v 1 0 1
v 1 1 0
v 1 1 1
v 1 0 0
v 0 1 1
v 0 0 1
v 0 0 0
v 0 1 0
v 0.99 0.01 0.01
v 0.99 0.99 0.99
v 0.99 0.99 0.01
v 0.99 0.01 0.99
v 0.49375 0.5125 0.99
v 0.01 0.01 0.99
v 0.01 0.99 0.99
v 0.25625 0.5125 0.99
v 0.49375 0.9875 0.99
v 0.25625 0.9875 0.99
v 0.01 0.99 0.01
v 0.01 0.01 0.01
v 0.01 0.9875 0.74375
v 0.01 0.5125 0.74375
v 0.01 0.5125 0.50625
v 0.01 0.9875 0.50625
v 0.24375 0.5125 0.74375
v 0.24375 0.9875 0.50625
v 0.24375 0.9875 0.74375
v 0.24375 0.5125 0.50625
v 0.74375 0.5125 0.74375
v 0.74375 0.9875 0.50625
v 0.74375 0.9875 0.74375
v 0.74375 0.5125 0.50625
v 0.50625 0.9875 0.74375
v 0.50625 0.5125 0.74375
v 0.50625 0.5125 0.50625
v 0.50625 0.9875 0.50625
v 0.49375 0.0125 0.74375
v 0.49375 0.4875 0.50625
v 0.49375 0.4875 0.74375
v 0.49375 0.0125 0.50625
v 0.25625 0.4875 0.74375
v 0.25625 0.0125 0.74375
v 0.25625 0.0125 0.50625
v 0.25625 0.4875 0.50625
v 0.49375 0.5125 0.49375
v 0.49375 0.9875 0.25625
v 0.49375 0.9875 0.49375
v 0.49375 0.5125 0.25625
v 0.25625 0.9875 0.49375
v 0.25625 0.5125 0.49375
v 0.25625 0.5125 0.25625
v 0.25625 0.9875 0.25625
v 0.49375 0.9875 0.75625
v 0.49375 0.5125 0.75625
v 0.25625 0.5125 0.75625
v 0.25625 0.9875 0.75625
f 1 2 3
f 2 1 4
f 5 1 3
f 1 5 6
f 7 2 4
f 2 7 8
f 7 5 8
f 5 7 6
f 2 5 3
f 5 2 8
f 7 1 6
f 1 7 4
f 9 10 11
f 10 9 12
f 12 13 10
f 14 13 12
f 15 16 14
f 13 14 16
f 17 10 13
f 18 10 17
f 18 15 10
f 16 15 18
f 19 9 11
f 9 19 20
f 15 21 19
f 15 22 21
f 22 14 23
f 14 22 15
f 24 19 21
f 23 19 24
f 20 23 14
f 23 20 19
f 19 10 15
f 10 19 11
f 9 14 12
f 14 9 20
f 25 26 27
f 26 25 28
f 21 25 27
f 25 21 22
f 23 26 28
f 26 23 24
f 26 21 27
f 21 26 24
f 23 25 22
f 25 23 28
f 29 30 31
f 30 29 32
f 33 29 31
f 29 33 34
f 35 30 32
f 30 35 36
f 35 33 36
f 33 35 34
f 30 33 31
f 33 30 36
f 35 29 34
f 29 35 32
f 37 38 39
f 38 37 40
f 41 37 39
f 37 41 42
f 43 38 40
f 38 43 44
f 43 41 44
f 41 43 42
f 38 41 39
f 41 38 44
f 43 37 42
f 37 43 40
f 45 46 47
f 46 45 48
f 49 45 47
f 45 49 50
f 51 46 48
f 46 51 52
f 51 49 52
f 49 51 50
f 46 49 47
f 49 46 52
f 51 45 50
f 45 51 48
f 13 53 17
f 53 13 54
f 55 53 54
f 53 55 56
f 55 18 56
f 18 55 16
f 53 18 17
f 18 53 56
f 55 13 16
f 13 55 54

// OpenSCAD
translate([0.125, 0.75, 0.625]) color([0.23874719597172656, 0.5159213977515871, 0.8042715508319355]) cube([0.2375, 0.475, 0.2375], center=true);
translate([0.625, 0.75, 0.625]) color([0.6755197251802578, 0.41487488756696345, 0.5733633065217538]) cube([0.2375, 0.475, 0.2375], center=true);
translate([0.375, 0.25, 0.625]) color([0.8352652083788017, 0.4789645616530247, 0.8888242662849705]) cube([0.2375, 0.475, 0.2375], center=true);
translate([0.375, 0.75, 0.375]) color([0.7977003312522131, 0.4430245559395397, 0.5757872208285841]) cube([0.2375, 0.475, 0.2375], center=true);
translate([0.375, 0.75, 0.875]) color([0.18894415855786206, 0.8084526775944827, 0.5240727557148024]) cube([0.2375, 0.475, 0.2375], center=true);
color([0.3,0.3,0.3,0.3]) difference() { cube([1,1,1]); translate([0.01,0.01,0.01]) cube([0.98,0.98,0.98]); }
